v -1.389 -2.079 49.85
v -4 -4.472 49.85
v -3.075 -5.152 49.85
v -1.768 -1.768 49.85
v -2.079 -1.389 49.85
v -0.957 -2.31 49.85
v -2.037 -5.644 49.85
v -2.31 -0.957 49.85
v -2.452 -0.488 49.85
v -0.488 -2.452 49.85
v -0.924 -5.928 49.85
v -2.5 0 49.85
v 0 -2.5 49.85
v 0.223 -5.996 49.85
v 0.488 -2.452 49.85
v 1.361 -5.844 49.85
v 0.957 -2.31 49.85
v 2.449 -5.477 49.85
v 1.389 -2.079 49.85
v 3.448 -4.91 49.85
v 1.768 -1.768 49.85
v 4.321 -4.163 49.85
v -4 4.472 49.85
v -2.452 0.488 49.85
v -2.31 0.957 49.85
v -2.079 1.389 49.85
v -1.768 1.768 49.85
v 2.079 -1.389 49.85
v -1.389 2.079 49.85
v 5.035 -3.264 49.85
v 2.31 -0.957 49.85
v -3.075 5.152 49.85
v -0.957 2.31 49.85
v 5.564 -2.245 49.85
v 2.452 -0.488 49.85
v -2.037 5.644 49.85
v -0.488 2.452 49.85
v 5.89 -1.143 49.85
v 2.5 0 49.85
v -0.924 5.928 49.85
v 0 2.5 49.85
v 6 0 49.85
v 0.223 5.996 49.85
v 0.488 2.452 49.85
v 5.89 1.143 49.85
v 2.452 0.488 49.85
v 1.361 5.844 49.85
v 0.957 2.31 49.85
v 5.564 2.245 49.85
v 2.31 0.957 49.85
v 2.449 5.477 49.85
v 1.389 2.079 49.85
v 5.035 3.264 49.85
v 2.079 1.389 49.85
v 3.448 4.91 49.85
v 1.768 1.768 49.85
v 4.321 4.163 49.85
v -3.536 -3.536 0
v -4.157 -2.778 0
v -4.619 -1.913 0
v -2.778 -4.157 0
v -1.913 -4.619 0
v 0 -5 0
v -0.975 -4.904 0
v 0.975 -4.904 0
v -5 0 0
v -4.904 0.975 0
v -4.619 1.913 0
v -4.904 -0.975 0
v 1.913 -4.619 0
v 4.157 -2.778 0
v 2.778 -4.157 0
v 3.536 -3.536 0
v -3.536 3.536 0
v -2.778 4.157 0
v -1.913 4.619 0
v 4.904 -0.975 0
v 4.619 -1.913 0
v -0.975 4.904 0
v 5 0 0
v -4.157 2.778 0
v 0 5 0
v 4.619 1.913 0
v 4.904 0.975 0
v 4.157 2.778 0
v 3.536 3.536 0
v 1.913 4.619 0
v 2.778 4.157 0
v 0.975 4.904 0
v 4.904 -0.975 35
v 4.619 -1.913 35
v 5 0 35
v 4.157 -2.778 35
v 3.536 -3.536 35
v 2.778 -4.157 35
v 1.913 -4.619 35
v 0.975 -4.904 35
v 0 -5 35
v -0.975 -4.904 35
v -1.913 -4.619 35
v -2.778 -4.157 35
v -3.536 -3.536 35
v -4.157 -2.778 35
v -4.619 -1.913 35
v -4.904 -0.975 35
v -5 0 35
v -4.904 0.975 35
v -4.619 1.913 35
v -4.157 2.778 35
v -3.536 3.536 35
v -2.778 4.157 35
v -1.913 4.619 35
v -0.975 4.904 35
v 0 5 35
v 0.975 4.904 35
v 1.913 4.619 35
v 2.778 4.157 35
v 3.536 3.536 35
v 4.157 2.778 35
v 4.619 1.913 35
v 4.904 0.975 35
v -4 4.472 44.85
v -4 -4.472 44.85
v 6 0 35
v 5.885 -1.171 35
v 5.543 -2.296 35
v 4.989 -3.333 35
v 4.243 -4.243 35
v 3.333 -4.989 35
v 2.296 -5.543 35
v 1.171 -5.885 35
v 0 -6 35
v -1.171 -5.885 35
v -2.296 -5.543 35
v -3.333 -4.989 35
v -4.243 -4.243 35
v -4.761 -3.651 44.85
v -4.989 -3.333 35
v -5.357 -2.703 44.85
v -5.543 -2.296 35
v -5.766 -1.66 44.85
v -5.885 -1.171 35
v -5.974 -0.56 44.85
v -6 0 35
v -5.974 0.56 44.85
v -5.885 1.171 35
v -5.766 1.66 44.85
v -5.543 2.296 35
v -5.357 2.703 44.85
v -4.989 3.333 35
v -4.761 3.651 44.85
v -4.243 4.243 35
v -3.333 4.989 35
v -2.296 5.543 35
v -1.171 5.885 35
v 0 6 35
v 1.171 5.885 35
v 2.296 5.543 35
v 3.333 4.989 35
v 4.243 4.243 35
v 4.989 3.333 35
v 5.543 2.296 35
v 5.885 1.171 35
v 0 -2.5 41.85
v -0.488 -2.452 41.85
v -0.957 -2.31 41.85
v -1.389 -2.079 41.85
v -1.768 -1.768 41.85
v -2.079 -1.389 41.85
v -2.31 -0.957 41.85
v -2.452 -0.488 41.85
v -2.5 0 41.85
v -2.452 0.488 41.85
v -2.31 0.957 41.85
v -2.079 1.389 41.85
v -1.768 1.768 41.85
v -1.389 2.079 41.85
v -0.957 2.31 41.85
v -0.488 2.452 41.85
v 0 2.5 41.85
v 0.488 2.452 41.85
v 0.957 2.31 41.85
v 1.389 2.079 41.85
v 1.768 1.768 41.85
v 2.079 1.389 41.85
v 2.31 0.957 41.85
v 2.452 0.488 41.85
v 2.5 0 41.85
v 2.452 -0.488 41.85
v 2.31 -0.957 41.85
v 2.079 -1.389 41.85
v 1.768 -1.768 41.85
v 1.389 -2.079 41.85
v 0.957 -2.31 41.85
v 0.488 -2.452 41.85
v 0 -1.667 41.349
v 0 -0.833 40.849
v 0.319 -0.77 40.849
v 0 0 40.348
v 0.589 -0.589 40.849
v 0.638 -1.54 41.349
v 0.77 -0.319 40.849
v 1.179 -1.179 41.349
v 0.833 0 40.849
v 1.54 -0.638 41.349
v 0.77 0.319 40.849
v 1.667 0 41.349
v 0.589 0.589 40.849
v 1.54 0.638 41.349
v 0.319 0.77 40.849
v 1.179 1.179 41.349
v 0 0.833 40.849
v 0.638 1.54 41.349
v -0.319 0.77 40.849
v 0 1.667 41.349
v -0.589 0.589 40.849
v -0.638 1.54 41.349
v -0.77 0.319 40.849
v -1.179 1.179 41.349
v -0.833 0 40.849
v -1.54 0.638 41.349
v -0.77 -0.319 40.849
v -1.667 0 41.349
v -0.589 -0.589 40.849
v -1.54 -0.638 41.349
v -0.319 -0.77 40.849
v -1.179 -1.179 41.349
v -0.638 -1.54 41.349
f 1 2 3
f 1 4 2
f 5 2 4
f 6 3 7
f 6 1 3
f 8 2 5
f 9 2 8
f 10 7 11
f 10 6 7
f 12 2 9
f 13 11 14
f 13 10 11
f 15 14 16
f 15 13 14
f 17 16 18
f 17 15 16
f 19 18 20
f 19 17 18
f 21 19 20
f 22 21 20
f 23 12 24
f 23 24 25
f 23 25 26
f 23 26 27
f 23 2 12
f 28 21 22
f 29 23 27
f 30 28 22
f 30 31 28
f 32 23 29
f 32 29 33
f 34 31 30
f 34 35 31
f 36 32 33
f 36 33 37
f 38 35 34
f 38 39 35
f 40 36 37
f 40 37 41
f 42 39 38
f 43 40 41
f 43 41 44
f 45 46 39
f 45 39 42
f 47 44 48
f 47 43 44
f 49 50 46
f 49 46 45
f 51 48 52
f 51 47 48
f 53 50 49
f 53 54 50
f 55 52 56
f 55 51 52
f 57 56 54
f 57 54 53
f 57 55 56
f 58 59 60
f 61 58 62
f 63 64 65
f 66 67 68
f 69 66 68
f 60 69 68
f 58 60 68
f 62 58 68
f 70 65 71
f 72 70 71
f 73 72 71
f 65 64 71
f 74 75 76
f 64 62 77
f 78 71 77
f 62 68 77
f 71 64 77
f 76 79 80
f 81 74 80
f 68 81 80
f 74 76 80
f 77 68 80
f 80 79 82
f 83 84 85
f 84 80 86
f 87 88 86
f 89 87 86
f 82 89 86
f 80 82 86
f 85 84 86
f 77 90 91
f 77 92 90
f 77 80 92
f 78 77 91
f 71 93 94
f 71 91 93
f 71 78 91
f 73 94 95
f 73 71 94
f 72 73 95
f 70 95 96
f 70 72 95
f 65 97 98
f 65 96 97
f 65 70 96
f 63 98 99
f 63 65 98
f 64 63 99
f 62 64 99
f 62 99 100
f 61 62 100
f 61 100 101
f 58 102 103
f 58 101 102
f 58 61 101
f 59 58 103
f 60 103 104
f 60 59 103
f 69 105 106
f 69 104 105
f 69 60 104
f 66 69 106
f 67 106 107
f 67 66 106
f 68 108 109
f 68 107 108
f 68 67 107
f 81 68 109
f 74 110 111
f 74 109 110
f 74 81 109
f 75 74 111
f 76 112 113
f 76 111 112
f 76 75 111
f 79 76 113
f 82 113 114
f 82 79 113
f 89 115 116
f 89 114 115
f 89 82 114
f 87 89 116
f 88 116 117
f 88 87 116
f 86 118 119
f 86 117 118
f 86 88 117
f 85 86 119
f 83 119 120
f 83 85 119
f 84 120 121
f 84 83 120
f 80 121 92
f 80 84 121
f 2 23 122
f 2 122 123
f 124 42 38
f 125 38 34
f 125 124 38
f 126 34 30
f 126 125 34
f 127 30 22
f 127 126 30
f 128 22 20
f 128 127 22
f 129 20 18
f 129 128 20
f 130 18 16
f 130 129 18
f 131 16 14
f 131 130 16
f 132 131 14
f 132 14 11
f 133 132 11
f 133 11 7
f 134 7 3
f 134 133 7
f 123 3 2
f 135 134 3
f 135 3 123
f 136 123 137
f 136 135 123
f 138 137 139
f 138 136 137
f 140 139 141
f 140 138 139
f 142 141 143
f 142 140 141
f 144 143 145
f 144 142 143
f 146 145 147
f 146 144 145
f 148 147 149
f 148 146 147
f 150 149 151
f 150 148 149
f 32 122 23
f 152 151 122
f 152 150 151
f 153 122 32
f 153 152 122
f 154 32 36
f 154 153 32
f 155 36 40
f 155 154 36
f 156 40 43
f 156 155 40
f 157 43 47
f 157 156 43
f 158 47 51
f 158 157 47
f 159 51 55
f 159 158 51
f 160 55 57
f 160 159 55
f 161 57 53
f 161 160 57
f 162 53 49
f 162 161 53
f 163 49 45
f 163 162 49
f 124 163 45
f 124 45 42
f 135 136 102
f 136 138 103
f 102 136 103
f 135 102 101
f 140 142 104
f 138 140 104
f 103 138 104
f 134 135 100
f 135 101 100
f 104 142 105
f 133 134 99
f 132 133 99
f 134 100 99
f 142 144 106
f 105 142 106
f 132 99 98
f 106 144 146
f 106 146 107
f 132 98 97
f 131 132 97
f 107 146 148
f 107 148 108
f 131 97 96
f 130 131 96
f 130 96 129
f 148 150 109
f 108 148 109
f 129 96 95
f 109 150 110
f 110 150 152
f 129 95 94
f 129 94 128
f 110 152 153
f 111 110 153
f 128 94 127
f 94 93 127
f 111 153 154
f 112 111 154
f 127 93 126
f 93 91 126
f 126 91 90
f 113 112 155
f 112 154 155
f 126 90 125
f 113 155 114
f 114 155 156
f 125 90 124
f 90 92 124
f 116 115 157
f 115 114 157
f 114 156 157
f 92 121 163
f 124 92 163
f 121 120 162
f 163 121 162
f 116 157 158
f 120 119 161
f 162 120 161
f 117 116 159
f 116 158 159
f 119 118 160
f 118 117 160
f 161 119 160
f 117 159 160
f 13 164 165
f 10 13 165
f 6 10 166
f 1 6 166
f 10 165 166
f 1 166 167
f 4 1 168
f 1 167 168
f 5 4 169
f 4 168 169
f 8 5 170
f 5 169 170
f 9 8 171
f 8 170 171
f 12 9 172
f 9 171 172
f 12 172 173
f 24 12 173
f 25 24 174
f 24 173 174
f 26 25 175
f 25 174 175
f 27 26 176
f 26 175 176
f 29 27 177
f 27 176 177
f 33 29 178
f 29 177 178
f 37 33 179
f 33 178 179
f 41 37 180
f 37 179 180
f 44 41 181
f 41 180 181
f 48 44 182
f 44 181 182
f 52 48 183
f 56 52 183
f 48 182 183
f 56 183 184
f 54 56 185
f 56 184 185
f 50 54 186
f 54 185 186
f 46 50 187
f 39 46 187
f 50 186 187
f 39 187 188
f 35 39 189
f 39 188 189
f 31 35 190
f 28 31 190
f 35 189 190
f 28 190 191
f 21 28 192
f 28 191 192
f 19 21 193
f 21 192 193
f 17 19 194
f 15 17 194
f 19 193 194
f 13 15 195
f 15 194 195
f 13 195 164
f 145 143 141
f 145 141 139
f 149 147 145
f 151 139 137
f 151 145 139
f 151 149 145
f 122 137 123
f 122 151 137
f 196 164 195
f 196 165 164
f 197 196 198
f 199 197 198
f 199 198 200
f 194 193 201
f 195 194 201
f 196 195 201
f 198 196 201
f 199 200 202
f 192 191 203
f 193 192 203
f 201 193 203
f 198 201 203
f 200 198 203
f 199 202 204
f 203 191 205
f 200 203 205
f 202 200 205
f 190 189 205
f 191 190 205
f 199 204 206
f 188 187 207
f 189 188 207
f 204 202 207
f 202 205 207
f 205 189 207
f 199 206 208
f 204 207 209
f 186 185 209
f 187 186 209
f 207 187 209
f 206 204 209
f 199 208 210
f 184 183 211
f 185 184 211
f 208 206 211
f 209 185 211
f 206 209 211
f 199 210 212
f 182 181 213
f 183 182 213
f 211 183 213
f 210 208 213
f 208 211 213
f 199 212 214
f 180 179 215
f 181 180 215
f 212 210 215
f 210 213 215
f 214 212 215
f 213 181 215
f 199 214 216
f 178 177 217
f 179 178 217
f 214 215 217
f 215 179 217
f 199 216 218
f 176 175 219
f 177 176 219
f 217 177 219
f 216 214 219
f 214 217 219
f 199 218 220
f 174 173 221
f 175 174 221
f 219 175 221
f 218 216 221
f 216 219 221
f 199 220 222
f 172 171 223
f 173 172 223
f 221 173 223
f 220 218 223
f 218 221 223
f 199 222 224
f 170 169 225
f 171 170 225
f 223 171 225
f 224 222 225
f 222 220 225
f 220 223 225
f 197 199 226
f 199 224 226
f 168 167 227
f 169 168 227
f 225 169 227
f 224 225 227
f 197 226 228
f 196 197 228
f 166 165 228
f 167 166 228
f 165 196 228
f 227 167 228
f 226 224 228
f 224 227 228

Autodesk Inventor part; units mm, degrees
ref_plane "YZ Plane" through (0, 0, 0) normal (1, 0, 0) x (0, 1, 0)
ref_plane "XZ Plane" through (0, 0, 0) normal (0, 1, 0) x (-1, 0, 0)
sketch "スケッチ1" plane through (0, 0, 0) normal (0, 0, 1) x (1, 0, 0)
  point P0 (0, 0)
sketch "スケッチ2" plane through (0, 0, 0) normal (0, 0, 1) x (1, 0, 0)
  circle A0 centre (0, 0) radius 5
  dimension "d0" = 10
extrude "押し出し1" add sketch "スケッチ2" along normal blind 35
thread "ねじ1" size "M10x1.5" class "6g" standard "ANSI Metric M Profile" length 10
sketch "スケッチ3" plane through (0, 0, 35) normal (0, 0, 1) x (1, 0, 0)
  point P0 (0, 0)
sketch "スケッチ4" plane through (0, 0, 35) normal (0, 0, 1) x (1, 0, 0)
  circle A0 centre (0, 0) radius 6
  dimension "d5" = 12
extrude "押し出し2" add sketch "スケッチ4" along normal blind 14.85
sketch "スケッチ5" plane through (0, 0, 49.85) normal (0, 0, 1) x (1, 0, 0)
  line L0 (0, 0) -> (0, 6)
  circle A0 centre (0, 0) radius 6 projected
ref_plane "作業平面1" through (0, 6, 49.85) normal (0, 1, 0) x (-1, 0, 0)
sketch "スケッチ9" plane through (0, 0, 49.85) normal (0, 0, 1) x (1, 0, 0)
  point P0 (0, 0)
  point P1 (0, 0)
hole "穴2" at (0, 0, 49.85) direction (0, 0, -1) diameter 5 depth 8 tip angle 118
thread "ねじ3" size "M5x0.8" class "6H" standard "ANSI Metric M Profile" full length
sketch "スケッチ10" plane through (0, 0, 49.85) normal (0, 0, 1) x (1, 0, 0)
  arc A0 (-4, 4.4721) -> (-4, -4.4721) centre (0, 0) ccw
  line L0 (-4, 0) -> (-4, 4.4721)
  line L1 (-4, 0) -> (-4, -4.4721)
  dimension "d34" = 12
  dimension "d35" = 4
extrude "押し出し4" cut sketch "スケッチ10" against normal blind 5
properties part number "回転アーム付き計測輪シャフト"
